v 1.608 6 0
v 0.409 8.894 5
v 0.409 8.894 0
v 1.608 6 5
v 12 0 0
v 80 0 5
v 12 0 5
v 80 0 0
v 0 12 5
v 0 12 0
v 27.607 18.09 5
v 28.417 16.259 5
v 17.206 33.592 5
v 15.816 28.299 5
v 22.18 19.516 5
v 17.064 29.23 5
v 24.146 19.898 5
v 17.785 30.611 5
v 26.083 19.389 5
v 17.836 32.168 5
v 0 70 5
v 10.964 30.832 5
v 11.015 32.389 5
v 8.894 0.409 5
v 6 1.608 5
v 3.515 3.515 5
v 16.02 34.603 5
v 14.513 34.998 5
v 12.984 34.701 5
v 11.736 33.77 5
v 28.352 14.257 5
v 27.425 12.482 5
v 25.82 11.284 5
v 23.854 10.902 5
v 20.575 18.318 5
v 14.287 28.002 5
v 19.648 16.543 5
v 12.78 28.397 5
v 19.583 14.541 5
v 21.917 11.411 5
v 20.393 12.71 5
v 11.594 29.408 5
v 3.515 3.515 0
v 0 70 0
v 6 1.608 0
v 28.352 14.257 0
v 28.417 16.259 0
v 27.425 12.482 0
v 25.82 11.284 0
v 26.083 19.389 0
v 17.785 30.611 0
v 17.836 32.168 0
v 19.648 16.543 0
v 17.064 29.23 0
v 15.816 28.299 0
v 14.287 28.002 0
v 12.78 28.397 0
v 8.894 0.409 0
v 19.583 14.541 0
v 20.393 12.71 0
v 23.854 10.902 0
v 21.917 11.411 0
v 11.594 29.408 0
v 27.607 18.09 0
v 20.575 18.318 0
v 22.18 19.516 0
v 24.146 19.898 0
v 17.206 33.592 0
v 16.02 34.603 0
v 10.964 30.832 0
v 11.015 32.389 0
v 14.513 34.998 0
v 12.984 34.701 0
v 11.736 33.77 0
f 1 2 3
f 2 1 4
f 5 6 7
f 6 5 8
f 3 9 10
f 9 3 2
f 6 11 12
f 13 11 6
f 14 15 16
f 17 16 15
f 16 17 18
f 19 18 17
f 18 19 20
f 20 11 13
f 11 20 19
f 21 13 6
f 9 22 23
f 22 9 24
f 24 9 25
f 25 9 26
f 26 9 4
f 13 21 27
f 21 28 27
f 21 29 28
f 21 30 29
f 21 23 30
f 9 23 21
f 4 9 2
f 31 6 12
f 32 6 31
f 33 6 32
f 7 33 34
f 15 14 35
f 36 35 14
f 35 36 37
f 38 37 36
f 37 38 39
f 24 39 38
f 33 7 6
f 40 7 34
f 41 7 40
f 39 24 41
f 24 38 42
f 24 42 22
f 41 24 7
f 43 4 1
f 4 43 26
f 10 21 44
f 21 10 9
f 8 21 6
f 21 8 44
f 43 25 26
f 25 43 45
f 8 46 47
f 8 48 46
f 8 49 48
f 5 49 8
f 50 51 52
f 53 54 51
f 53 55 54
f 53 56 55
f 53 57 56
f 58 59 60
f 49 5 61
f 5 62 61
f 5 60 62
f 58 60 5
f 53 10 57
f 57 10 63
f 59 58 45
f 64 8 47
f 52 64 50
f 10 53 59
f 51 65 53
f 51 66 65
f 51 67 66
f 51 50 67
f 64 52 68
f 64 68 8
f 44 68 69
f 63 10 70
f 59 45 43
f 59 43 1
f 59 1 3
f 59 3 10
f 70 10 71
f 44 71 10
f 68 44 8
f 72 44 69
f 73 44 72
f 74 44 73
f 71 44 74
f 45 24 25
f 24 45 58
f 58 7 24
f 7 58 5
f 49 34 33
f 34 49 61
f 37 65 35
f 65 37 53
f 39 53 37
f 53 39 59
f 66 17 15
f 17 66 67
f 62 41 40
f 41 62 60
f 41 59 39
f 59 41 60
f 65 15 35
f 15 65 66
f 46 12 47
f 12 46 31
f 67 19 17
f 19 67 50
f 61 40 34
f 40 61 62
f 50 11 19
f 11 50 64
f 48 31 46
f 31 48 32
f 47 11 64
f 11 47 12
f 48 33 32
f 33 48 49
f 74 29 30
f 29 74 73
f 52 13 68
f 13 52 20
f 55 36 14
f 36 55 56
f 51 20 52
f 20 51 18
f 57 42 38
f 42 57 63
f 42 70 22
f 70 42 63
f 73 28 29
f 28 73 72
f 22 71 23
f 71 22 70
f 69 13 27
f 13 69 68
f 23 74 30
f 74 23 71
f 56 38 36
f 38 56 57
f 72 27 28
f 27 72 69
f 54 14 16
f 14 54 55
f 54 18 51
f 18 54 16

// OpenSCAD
$fn = 32;

// ----------------------------------------------------------------------
// Bracket plate: corner pad 80 x 70, fillet R12
// ----------------------------------------------------------------------

// --- parameters (mm) ---
hole_r = 3.5;             // bolt hole radius
plate_t = 5;              // plate thickness, Z (extrusion height)
leg_a = 80;               // base leg
leg_b = 70;               // height leg
fillet_r = 12;            // right-angle fillet radius

hole_d1 = 2 * hole_r + 2;
hole_d2 = 2 * hole_r;

profile = [[12, 0], [80, 0], [0, 70], [0, 12], [0.409, 8.894], [1.608, 6], [3.515, 3.515], [6, 1.608], [8.894, 0.409]];  // primary outline, 9 points, counter clockwise
void_1 = [[28.417, 16.259], [27.607, 18.09], [26.083, 19.389], [24.146, 19.898], [22.18, 19.516], [20.575, 18.318], [19.648, 16.543], [19.583, 14.541], [20.393, 12.71], [21.917, 11.411], [23.854, 10.902], [25.82, 11.284], [27.425, 12.482], [28.352, 14.257]];  // mount hole 1, 14 points
void_2 = [[17.836, 32.168], [17.206, 33.592], [16.02, 34.603], [14.513, 34.998], [12.984, 34.701], [11.736, 33.77], [11.015, 32.389], [10.964, 30.832], [11.594, 29.408], [12.78, 28.397], [14.287, 28.002], [15.816, 28.299], [17.064, 29.23], [17.785, 30.611]];  // mount hole 2, 14 points

// --- the one profile operation ---
difference() {
  linear_extrude(height = plate_t) polygon(points = profile);
  translate([0, 0, -1])
    linear_extrude(height = plate_t + 2) polygon(points = void_1);
  translate([0, 0, -1])
    linear_extrude(height = plate_t + 2) polygon(points = void_2);
}
